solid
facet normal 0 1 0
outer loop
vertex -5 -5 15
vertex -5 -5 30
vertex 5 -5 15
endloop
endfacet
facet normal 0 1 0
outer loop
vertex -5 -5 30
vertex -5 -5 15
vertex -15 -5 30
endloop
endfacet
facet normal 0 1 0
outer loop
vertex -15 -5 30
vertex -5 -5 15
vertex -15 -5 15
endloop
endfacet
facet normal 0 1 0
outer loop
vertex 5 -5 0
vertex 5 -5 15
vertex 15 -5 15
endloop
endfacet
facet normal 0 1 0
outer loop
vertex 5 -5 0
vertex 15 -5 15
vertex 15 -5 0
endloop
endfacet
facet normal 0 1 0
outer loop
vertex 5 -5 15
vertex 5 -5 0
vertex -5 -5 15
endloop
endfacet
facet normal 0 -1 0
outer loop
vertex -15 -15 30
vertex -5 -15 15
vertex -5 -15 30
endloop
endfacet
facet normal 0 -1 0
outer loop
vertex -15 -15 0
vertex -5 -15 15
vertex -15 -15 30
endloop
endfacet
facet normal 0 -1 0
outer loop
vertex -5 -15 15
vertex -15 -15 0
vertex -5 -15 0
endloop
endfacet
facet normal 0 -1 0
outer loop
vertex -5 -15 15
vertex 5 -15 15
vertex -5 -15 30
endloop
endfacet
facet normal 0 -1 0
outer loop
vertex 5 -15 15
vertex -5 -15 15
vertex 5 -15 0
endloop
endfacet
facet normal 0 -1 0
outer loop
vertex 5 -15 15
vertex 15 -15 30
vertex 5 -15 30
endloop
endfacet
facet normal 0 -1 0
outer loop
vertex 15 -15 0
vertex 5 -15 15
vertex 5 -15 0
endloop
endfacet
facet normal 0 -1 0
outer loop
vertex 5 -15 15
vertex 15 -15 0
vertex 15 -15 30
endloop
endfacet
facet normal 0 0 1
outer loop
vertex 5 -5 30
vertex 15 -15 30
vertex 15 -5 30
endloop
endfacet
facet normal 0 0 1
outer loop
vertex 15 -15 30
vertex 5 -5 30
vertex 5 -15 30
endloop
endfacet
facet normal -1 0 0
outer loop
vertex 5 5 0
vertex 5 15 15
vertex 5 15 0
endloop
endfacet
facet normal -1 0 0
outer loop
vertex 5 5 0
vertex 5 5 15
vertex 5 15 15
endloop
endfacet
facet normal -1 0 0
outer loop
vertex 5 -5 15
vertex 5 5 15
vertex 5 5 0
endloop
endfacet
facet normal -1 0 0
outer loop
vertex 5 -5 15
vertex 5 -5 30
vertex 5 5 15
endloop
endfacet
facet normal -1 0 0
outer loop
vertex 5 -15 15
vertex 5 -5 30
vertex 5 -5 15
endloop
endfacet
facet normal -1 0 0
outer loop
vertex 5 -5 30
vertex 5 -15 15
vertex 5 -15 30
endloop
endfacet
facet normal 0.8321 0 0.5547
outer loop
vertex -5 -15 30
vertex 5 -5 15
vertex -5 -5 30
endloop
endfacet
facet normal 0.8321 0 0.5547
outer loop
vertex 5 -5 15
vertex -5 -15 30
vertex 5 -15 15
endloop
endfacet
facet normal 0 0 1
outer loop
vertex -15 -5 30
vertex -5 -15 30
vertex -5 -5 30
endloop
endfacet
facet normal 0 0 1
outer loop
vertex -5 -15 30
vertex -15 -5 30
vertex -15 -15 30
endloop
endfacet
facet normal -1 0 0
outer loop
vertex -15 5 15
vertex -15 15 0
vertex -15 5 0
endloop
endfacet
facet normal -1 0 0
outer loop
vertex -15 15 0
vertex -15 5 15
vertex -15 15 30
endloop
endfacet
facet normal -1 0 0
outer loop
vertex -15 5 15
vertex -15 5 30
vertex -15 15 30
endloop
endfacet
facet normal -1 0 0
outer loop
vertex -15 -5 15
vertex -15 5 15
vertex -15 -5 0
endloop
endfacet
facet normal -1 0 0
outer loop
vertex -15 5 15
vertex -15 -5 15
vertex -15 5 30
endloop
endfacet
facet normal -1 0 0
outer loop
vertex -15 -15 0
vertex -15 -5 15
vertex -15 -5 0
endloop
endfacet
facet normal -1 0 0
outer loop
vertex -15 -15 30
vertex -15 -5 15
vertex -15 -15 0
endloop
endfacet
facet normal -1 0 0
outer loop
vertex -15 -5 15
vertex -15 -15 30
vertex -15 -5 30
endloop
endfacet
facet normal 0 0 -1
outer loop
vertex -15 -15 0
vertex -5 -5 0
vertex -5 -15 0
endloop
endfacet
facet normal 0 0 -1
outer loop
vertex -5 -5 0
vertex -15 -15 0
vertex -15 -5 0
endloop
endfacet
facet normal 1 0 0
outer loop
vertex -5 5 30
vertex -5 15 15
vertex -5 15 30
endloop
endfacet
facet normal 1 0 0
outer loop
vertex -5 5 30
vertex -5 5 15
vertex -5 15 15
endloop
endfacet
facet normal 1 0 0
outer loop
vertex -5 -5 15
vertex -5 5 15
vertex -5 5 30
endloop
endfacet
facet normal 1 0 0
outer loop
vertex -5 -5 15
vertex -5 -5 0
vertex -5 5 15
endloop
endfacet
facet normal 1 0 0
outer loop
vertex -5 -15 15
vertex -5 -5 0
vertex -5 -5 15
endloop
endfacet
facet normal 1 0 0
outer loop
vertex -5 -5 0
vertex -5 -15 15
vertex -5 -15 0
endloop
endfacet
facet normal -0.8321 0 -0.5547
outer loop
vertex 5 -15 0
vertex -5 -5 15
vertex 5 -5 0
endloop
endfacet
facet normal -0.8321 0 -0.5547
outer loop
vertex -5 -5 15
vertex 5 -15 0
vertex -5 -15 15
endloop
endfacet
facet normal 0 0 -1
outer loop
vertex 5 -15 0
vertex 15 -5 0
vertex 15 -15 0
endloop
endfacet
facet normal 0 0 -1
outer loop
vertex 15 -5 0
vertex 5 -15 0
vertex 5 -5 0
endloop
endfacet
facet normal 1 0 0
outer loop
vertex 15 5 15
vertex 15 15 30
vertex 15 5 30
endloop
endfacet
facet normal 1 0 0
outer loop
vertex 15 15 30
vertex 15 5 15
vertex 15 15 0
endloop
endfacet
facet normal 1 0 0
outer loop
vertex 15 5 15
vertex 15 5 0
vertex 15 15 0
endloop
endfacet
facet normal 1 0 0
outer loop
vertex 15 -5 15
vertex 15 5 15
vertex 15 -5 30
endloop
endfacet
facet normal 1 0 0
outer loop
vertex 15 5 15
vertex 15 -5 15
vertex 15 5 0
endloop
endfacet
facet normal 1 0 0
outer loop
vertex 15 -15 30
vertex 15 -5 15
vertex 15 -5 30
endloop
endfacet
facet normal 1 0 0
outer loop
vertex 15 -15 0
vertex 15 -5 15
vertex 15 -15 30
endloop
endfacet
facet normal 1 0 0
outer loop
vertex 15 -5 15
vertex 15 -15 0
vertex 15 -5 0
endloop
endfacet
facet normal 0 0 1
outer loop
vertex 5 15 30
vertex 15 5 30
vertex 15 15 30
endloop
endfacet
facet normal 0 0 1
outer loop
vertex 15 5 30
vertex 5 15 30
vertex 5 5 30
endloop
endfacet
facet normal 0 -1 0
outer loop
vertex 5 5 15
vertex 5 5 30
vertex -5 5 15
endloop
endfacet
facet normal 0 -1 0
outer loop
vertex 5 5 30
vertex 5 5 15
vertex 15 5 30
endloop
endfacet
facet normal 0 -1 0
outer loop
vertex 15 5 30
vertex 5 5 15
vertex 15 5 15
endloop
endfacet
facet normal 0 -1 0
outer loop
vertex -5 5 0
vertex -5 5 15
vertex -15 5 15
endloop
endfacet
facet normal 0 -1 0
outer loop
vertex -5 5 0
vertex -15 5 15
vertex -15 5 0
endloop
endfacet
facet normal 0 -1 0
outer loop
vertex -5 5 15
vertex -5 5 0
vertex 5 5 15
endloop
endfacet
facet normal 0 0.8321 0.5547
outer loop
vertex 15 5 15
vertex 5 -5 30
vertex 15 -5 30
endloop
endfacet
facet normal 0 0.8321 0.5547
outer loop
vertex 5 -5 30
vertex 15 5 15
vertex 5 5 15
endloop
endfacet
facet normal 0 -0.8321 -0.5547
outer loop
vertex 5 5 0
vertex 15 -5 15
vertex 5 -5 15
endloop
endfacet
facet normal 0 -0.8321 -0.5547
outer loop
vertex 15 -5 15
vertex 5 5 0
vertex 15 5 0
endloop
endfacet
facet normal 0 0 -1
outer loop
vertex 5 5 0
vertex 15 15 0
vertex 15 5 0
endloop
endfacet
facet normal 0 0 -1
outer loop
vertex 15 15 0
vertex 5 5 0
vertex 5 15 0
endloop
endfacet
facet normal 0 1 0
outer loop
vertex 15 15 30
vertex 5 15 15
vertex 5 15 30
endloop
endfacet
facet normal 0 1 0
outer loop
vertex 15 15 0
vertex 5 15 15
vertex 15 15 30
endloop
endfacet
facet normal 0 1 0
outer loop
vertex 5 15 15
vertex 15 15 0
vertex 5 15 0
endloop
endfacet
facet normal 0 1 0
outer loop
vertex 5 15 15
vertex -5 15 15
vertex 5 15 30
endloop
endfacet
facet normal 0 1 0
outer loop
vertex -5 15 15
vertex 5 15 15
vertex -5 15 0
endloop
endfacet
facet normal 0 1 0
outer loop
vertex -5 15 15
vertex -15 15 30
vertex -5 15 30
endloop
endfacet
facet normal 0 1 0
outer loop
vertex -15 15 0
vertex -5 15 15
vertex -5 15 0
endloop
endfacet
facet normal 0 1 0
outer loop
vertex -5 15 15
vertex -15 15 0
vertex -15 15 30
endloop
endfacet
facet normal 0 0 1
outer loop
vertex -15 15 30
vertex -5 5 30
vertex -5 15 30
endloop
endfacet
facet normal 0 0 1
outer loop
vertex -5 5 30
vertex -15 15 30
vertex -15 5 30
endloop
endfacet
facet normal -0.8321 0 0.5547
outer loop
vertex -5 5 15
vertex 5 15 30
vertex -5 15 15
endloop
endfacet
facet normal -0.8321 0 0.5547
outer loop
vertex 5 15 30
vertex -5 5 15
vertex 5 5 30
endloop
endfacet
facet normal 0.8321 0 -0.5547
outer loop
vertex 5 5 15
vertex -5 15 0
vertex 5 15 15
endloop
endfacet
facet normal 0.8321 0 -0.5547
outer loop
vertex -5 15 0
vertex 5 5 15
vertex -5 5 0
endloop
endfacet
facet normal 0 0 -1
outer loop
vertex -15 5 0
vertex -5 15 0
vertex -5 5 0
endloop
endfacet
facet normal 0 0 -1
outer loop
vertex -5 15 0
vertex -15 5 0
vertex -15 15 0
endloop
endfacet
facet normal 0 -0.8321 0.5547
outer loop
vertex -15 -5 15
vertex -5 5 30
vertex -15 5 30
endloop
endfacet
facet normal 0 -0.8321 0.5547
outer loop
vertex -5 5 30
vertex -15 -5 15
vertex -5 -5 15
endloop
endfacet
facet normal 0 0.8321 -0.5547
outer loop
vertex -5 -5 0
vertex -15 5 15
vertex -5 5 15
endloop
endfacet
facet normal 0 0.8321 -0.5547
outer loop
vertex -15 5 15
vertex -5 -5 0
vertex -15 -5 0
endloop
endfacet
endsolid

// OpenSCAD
module Nintendo64(height=30, width=10, distance=10) {

    module center() {
        polygon(points = [
            [-distance / 2, height/2],
            [-distance / 2, 0],
            [distance / 2, -height/2],
            [distance / 2, 0],
        ]);
    }

    module N() {
        translate([0, -distance/2, height/2]) {
            rotate([90, 0, 0]) {
                linear_extrude(height = width) {
                    union() {
                        for (i = [-distance, distance]) {
                            translate([i, 0, 0]) {
                                square(size = [width, height], center=true);
                            }
                        }
                        center();
                    }
                }
            }
        }
    }

    module main() {
        for (i = [0:3]) {
            rotate(i * 90) N();
        }
    }

    main();
}

Nintendo64();
